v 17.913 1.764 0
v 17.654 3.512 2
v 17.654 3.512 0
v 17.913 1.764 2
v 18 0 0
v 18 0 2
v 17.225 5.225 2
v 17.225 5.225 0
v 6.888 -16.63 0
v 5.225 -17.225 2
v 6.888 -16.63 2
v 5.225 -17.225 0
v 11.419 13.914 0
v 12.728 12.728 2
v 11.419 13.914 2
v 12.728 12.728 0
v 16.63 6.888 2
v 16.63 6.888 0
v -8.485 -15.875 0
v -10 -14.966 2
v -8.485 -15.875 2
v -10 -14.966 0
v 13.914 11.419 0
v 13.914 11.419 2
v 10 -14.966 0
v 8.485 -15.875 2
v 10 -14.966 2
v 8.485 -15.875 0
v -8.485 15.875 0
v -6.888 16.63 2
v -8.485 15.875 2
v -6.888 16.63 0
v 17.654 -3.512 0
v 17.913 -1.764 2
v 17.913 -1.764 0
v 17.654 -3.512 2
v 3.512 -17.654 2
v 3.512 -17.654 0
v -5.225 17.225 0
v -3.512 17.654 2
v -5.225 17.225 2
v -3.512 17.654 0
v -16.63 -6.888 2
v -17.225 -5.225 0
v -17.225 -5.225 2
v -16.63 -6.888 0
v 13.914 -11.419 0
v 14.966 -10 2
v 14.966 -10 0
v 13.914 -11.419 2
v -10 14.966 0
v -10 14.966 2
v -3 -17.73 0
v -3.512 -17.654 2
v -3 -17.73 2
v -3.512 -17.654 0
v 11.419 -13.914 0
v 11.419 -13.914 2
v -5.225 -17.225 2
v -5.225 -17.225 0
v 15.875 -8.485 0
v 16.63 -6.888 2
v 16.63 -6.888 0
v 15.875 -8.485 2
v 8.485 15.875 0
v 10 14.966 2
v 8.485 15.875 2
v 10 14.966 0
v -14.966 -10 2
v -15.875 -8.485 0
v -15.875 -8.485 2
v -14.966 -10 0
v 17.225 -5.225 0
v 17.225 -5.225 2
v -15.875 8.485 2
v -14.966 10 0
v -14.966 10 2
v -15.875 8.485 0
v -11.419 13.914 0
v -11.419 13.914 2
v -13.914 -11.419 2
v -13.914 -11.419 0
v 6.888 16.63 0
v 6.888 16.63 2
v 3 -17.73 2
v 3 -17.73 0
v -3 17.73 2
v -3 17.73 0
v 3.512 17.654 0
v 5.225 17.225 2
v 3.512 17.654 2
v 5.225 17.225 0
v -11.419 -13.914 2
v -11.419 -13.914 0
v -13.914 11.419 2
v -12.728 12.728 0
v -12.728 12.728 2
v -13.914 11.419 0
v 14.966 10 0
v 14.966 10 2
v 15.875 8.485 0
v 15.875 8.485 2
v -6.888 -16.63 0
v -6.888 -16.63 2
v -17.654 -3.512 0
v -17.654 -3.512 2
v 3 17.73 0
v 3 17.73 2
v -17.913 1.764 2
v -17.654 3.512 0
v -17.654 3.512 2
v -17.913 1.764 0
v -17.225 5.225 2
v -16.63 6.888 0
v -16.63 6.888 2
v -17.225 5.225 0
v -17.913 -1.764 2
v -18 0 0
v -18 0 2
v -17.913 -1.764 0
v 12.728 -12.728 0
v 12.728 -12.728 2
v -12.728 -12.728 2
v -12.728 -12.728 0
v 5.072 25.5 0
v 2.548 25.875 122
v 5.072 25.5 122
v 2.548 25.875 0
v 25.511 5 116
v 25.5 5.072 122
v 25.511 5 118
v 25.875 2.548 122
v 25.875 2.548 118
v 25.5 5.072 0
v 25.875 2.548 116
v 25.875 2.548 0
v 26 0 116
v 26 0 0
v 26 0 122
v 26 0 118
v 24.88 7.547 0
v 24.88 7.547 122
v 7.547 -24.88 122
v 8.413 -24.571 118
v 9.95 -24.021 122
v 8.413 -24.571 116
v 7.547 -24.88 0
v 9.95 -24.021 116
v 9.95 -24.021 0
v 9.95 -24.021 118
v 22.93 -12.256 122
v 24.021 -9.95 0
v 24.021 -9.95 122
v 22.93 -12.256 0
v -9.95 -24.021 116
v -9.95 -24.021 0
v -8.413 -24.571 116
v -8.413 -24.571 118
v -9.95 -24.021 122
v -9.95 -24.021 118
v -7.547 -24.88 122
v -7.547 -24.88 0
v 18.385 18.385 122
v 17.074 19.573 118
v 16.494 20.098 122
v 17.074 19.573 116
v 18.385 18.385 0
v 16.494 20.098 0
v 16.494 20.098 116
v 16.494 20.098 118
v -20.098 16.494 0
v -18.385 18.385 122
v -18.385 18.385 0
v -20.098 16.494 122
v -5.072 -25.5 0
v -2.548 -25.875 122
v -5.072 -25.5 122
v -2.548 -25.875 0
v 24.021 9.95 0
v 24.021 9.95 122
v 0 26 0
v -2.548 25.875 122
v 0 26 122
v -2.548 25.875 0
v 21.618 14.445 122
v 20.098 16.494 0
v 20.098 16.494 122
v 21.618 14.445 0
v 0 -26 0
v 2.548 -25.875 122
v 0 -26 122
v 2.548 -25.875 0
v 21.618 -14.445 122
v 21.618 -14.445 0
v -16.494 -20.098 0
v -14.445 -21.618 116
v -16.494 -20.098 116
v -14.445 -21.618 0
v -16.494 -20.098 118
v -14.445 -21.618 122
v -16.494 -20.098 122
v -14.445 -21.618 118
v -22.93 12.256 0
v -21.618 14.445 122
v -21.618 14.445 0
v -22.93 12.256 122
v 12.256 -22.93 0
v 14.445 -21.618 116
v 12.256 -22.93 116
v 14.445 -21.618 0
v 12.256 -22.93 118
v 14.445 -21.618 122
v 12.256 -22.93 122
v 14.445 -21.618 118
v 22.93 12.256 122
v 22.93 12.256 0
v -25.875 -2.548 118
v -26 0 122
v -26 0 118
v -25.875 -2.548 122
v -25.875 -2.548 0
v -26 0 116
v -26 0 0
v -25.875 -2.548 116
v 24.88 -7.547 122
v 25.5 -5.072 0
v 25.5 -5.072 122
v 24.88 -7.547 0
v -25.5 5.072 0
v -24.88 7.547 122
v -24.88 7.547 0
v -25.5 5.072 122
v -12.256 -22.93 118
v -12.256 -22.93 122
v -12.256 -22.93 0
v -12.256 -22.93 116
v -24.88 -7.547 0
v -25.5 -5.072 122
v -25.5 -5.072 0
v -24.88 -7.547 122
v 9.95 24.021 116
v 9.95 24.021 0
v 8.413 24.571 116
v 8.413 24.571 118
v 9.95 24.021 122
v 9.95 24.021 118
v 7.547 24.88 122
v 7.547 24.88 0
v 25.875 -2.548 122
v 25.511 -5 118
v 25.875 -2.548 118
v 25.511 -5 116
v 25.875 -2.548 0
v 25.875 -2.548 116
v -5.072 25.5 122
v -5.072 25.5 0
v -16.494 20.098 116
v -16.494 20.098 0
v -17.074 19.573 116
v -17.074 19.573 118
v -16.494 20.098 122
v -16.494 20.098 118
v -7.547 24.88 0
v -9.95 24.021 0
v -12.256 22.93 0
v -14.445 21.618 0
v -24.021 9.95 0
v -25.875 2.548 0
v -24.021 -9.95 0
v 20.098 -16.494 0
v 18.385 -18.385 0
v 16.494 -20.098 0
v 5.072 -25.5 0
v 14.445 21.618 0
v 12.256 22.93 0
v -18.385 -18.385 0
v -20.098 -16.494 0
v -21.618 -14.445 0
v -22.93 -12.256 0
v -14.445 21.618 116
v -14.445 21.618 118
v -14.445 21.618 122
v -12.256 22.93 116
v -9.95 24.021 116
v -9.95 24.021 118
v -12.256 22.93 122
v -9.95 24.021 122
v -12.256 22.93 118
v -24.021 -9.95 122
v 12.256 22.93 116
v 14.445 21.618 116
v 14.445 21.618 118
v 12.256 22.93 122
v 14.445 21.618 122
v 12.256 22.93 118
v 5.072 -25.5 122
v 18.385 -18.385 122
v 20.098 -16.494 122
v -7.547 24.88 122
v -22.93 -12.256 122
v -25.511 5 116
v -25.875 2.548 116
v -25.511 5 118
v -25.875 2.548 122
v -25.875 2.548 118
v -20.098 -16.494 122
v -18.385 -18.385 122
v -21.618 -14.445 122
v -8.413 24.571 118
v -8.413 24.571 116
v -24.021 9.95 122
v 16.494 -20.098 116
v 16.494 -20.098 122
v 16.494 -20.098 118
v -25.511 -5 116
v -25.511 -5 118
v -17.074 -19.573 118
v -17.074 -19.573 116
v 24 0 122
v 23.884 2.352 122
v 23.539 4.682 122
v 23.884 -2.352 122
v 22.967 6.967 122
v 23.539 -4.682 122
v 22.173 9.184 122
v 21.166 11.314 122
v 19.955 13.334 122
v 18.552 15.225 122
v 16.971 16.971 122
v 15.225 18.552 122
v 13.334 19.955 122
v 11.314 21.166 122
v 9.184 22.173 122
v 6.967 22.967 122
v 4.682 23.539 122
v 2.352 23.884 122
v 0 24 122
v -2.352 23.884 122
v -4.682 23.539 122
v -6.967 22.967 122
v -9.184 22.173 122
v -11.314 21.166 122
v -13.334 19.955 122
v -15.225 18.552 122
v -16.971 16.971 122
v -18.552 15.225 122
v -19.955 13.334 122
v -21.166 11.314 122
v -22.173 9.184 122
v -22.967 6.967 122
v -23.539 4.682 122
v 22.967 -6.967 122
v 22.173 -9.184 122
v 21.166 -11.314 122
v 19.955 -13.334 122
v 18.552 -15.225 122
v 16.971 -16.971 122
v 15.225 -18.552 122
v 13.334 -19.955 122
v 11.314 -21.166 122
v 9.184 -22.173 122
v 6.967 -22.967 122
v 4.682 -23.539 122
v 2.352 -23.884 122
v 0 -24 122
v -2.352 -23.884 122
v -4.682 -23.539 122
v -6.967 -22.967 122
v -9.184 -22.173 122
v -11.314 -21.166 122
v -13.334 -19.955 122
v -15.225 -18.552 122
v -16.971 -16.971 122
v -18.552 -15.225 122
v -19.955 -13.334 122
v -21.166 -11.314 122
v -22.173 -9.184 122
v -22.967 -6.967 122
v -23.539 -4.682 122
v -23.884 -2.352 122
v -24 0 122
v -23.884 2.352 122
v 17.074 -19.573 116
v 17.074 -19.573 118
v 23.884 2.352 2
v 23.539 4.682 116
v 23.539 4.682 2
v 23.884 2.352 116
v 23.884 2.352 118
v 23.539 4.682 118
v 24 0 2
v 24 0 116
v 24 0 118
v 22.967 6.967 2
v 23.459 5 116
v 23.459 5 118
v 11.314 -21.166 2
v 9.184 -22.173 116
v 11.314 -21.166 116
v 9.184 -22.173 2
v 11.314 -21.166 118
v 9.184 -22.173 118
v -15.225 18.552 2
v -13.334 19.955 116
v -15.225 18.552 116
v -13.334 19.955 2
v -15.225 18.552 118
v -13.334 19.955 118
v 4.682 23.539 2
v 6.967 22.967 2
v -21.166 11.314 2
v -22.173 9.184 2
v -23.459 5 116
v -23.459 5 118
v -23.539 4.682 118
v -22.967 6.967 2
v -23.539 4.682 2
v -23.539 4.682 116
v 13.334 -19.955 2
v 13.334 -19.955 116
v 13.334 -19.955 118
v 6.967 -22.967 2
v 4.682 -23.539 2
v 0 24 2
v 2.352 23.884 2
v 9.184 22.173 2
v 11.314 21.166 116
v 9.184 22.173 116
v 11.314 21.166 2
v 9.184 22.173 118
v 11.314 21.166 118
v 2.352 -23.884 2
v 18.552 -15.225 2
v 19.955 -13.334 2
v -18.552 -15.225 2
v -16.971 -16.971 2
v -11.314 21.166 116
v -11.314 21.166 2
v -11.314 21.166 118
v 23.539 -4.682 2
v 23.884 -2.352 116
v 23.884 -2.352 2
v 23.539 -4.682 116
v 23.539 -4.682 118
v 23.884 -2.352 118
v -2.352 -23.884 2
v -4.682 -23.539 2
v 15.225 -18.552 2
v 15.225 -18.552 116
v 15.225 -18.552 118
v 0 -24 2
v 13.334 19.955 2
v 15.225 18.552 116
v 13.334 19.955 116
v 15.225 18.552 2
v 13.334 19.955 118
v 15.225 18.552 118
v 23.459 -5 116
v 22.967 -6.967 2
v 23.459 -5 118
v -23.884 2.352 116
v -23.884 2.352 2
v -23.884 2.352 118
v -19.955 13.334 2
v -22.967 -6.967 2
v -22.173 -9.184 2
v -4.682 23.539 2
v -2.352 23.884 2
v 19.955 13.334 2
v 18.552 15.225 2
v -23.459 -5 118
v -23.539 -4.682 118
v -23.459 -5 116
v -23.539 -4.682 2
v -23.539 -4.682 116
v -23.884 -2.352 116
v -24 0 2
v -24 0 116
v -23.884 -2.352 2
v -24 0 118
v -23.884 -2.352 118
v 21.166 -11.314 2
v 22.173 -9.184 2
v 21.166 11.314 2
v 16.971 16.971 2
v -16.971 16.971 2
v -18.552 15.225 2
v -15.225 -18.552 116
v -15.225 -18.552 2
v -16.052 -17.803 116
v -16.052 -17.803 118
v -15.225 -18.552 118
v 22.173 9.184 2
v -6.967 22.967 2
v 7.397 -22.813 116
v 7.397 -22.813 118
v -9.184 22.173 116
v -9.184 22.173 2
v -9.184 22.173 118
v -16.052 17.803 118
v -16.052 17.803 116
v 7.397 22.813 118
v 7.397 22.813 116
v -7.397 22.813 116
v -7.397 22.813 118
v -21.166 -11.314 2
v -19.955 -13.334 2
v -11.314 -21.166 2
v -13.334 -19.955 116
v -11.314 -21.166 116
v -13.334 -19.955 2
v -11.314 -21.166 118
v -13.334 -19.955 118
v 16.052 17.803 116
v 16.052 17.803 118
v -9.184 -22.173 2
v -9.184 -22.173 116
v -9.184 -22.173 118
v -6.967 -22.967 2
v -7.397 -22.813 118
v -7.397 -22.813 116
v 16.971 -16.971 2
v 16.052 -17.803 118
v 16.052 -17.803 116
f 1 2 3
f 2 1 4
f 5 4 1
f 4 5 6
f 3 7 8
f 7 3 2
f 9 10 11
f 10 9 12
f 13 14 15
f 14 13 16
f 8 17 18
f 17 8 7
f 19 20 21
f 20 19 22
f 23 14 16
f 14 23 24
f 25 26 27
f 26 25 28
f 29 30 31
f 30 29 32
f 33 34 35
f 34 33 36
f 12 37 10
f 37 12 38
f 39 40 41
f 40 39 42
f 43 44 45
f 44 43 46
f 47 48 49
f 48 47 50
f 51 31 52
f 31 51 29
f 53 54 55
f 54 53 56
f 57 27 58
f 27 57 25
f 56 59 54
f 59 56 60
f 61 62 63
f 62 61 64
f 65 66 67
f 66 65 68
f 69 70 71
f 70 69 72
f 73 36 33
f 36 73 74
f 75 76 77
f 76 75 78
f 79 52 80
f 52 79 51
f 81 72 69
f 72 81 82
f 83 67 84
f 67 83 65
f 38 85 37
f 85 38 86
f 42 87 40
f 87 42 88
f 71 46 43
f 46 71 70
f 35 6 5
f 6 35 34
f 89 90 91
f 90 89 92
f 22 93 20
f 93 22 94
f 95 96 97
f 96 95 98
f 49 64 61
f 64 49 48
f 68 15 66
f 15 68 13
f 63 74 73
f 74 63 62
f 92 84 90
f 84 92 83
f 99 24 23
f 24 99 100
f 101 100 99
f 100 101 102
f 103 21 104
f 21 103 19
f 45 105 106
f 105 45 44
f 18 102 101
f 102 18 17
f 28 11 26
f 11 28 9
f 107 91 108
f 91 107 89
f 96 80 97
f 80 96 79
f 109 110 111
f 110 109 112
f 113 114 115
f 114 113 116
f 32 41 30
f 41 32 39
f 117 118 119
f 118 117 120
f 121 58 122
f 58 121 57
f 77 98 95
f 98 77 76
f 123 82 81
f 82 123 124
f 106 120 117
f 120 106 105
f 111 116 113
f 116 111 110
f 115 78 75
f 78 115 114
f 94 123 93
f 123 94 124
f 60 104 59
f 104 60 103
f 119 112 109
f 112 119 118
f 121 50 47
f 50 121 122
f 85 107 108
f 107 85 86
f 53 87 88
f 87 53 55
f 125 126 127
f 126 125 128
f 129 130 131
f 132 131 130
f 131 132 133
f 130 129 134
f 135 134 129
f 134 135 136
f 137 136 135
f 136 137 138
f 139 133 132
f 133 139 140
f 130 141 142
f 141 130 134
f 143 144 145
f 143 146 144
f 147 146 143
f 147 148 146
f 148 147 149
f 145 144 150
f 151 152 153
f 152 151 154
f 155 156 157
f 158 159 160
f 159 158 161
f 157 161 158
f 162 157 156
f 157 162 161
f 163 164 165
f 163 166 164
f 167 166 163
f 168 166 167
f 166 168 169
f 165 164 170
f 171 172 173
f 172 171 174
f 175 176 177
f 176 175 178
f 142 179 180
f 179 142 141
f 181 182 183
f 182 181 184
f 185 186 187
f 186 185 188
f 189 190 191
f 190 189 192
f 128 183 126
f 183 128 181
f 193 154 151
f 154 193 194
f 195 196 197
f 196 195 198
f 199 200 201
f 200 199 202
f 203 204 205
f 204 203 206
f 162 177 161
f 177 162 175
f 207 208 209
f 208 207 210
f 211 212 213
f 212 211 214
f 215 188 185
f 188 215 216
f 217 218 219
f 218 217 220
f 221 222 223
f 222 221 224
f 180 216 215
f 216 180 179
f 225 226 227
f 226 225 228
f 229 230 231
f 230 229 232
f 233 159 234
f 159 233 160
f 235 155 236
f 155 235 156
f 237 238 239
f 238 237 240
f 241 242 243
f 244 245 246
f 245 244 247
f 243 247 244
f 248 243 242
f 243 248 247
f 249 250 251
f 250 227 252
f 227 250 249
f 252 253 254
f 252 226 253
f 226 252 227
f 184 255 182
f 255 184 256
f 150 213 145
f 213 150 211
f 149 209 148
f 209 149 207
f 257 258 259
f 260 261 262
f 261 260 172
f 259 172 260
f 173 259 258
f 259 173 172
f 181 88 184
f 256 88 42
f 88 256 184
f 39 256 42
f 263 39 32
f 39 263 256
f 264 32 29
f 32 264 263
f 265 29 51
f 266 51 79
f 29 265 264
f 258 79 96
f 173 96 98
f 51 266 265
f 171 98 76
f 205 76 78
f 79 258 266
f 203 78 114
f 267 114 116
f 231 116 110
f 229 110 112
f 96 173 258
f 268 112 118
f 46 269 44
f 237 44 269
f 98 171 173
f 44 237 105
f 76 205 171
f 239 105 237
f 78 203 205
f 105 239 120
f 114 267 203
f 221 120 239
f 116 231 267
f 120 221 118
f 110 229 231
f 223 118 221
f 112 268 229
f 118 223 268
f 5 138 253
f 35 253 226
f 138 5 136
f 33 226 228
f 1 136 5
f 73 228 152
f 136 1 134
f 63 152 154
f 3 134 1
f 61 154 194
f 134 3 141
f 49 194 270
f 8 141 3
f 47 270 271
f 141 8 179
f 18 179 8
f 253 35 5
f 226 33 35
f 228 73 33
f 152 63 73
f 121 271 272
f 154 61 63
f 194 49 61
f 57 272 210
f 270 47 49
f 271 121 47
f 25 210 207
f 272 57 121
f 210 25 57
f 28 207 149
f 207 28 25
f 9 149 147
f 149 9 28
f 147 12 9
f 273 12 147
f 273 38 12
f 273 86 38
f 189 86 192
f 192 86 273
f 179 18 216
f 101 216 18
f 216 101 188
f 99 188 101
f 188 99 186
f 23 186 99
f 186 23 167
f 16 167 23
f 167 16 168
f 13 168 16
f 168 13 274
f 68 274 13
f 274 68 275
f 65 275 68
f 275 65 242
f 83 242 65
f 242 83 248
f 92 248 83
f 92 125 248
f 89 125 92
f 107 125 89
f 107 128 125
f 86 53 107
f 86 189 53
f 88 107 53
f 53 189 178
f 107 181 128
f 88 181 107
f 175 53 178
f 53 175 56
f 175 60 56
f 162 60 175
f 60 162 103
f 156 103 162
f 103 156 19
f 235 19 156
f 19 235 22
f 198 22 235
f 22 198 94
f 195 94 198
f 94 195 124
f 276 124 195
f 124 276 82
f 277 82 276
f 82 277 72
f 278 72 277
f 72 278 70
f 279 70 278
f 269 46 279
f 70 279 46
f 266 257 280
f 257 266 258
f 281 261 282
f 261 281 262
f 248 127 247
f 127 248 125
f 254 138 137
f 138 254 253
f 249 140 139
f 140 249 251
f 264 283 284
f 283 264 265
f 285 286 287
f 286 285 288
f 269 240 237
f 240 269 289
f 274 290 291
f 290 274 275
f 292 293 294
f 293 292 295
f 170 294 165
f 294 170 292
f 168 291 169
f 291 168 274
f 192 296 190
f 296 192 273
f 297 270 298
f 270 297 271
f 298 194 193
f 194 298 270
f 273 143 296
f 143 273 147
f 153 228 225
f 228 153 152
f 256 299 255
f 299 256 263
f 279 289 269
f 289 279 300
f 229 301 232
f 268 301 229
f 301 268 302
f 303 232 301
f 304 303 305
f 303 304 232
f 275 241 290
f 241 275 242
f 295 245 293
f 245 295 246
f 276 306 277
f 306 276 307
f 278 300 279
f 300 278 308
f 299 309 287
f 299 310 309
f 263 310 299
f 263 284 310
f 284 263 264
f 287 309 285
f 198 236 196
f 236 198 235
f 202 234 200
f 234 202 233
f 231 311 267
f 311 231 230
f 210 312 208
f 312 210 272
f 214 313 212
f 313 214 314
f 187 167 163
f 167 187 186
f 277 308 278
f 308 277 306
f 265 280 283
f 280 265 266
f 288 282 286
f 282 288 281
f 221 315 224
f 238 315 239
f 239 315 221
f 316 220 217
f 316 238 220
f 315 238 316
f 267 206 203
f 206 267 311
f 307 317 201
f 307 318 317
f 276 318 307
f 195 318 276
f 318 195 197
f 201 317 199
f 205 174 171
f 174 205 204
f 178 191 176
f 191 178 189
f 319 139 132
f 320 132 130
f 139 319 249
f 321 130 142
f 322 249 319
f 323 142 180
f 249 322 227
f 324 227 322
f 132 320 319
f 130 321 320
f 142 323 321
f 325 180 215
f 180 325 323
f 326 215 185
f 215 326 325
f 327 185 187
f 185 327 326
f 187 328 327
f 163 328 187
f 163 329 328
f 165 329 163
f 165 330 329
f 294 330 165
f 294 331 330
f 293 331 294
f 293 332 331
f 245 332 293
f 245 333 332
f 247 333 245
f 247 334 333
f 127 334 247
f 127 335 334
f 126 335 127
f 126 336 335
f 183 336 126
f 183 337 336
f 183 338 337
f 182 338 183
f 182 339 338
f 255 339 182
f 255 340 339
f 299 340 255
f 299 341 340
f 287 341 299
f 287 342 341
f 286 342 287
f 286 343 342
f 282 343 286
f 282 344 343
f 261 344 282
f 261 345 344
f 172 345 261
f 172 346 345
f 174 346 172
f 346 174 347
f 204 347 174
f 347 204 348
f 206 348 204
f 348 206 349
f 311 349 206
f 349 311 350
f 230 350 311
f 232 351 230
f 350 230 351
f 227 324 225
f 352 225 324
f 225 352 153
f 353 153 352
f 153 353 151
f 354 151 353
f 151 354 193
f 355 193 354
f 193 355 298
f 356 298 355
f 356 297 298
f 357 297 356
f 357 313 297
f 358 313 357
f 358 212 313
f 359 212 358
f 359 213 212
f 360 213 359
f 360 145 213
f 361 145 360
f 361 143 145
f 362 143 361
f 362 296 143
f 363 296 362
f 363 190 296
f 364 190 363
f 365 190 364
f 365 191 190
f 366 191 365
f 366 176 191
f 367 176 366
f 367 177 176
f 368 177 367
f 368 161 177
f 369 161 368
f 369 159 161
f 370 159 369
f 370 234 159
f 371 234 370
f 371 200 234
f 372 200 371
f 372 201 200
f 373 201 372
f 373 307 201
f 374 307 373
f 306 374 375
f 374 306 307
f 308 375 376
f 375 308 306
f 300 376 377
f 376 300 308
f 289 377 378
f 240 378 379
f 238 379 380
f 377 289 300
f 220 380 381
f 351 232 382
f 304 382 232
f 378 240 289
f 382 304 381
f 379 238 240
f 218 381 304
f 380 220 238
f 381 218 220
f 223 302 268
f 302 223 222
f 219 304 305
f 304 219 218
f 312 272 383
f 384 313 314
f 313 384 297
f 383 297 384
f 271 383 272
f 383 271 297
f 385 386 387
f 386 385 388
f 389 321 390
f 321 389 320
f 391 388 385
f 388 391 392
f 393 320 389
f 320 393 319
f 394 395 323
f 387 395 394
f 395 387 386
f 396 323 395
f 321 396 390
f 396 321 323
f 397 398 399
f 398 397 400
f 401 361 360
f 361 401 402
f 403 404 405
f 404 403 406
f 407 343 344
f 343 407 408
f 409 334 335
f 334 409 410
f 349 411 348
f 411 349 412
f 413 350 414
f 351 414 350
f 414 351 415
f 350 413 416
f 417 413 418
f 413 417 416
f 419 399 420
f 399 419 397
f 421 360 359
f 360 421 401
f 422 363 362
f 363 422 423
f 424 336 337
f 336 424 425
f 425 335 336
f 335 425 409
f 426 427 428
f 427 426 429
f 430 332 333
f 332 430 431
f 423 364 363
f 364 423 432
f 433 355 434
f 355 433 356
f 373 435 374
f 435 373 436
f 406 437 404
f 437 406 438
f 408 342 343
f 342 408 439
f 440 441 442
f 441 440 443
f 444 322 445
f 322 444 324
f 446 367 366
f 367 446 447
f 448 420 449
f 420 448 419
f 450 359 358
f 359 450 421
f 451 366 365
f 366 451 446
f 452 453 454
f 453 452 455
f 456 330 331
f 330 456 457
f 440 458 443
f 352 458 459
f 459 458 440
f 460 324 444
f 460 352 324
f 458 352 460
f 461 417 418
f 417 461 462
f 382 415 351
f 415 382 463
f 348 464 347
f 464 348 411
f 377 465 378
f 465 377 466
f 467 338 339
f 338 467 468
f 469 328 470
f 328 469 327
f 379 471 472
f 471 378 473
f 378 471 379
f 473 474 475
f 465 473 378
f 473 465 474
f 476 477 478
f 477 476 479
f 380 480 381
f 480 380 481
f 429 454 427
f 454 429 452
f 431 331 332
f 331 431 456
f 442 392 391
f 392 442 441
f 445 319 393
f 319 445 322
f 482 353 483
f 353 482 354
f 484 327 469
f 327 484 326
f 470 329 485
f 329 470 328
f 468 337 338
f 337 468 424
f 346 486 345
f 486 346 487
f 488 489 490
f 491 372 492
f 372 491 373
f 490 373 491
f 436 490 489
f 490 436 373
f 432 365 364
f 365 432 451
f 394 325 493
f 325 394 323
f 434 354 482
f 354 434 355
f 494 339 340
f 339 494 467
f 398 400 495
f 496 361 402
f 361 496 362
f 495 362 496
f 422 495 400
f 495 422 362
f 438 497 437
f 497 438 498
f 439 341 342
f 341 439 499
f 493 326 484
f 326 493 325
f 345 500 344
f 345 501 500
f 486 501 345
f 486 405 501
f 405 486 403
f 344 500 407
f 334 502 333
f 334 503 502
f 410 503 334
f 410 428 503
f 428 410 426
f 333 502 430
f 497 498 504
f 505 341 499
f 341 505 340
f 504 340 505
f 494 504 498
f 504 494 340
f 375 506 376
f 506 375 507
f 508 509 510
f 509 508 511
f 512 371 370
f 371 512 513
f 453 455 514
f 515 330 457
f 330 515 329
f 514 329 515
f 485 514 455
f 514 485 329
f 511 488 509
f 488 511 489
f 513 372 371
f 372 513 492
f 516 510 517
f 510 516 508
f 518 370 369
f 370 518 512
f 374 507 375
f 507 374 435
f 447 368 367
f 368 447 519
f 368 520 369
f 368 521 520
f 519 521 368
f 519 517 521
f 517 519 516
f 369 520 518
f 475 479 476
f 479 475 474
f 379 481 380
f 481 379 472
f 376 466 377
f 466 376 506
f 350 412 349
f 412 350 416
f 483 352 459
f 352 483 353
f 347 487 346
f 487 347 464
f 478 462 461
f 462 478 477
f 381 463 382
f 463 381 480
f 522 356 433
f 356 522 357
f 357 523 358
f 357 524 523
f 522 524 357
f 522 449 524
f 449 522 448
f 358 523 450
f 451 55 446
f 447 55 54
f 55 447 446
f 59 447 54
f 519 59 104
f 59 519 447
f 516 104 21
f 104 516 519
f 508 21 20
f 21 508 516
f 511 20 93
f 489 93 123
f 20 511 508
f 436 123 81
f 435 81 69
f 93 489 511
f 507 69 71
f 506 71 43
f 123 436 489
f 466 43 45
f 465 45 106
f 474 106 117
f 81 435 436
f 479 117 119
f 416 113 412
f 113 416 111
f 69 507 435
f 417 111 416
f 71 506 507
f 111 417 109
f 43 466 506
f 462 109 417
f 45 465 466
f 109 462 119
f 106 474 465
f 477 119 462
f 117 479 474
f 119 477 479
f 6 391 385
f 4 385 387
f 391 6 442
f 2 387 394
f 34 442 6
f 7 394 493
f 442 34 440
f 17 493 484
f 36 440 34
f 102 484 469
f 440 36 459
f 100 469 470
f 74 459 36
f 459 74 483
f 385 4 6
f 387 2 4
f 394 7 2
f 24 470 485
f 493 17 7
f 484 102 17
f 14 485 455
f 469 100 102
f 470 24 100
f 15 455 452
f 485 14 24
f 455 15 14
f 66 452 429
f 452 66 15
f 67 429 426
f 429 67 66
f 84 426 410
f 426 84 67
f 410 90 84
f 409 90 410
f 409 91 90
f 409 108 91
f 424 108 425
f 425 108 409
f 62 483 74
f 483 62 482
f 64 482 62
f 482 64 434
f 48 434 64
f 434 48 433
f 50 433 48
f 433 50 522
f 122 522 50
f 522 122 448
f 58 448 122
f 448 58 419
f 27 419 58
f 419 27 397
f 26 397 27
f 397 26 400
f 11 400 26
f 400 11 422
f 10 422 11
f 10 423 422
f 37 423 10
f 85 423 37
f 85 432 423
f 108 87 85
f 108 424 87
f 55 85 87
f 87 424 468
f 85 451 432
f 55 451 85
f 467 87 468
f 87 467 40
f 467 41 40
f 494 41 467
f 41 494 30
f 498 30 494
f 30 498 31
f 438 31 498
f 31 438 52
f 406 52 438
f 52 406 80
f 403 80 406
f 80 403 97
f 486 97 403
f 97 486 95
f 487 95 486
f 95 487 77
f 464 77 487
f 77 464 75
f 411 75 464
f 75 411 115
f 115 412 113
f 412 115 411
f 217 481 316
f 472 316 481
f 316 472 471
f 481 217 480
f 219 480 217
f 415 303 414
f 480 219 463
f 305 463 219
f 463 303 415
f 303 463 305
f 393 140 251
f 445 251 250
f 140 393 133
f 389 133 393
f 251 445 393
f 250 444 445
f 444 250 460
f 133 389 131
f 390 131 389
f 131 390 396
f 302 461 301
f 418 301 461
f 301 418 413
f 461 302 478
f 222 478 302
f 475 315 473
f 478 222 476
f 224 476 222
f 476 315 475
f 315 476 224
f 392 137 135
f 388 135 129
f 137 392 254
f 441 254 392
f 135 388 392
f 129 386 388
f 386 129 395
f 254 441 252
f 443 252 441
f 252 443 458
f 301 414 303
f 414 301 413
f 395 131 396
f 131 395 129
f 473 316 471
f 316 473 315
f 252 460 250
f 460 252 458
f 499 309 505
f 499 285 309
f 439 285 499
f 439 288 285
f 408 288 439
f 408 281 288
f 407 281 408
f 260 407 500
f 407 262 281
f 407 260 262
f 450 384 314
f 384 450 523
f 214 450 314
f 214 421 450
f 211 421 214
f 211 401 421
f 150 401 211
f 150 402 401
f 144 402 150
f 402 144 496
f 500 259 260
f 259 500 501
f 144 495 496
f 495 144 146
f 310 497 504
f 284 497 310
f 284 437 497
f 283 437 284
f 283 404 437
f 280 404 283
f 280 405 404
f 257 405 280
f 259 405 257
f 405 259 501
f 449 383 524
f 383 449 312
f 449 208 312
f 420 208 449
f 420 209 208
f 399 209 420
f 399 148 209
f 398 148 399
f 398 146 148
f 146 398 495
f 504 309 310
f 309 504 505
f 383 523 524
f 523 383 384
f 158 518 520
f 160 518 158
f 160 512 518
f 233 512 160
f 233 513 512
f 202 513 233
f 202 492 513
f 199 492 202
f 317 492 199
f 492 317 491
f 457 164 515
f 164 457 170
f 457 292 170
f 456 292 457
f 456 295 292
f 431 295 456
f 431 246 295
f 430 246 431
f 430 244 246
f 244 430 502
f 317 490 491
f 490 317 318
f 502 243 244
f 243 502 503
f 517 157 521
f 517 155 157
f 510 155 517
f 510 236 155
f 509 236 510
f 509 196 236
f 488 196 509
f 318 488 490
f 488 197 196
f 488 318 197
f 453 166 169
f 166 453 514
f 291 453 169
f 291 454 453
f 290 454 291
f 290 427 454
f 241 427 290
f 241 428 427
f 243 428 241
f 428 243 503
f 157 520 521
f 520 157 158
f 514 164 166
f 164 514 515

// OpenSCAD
$fn=64;


tube();
// translate([0,0,122]) mirror([0,0,1]) cap();


module cutout() {
  difference() {
    intersection() {
      translate([0,0,-0.1]) cylinder(r=23.5,h=2.2);
      translate([0,0,-0.2]) cylinder(r=18,h=2.4);
    }
    translate([-3,-20,-0.2]) cube([6,40,2.4]);
  }
}


module cap() {
  difference() {
    cylinder(r=23.5,h=2);
    cutout();
  }
 
  intersection() {
    difference() {
      cylinder(r=23.5,h=6);
      translate([0,0,-0.1]) cylinder(r=23.5-1.2,h=6.2);
    }
    union() {
      translate([-50,-5,-0.1]) cube([100,10,6.2]);
      rotate([0,0,360/3]) translate([-50,-5,-0.1]) cube([100,10,6.2]);
      rotate([0,0,360/6]) translate([-50,-5,-0.1]) cube([100,10,6.2]);  
    }
  }

  blep();
  rotate([0,0,60]) blep();
  rotate([0,0,60*2]) blep();
  rotate([0,0,60*3]) blep();
  rotate([0,0,60*4]) blep();
  rotate([0,0,60*5]) blep();


}

module blep() {
  for ( i = [-9:8]) {
    hull() {
      rotate([0,0,i]) translate([23.5,0,5]) sphere(r=1,$fn=16);
      rotate([0,0,i+1]) translate([23.5,0,5]) sphere(r=1,$fn=16);
    }
  }
}

module tube() {
  difference() {
    cylinder(r=26,h=122);
    cutout();
    translate([0,0,2]) cylinder(r=24,h=120.1);
    translate([-50,-5,116]) cube([100,10,2]);
    rotate([0,0,360/3]) translate([-50,-5,116]) cube([100,10,2]);
    rotate([0,0,360/6]) translate([-50,-5,116]) cube([100,10,2]);
  }
}
